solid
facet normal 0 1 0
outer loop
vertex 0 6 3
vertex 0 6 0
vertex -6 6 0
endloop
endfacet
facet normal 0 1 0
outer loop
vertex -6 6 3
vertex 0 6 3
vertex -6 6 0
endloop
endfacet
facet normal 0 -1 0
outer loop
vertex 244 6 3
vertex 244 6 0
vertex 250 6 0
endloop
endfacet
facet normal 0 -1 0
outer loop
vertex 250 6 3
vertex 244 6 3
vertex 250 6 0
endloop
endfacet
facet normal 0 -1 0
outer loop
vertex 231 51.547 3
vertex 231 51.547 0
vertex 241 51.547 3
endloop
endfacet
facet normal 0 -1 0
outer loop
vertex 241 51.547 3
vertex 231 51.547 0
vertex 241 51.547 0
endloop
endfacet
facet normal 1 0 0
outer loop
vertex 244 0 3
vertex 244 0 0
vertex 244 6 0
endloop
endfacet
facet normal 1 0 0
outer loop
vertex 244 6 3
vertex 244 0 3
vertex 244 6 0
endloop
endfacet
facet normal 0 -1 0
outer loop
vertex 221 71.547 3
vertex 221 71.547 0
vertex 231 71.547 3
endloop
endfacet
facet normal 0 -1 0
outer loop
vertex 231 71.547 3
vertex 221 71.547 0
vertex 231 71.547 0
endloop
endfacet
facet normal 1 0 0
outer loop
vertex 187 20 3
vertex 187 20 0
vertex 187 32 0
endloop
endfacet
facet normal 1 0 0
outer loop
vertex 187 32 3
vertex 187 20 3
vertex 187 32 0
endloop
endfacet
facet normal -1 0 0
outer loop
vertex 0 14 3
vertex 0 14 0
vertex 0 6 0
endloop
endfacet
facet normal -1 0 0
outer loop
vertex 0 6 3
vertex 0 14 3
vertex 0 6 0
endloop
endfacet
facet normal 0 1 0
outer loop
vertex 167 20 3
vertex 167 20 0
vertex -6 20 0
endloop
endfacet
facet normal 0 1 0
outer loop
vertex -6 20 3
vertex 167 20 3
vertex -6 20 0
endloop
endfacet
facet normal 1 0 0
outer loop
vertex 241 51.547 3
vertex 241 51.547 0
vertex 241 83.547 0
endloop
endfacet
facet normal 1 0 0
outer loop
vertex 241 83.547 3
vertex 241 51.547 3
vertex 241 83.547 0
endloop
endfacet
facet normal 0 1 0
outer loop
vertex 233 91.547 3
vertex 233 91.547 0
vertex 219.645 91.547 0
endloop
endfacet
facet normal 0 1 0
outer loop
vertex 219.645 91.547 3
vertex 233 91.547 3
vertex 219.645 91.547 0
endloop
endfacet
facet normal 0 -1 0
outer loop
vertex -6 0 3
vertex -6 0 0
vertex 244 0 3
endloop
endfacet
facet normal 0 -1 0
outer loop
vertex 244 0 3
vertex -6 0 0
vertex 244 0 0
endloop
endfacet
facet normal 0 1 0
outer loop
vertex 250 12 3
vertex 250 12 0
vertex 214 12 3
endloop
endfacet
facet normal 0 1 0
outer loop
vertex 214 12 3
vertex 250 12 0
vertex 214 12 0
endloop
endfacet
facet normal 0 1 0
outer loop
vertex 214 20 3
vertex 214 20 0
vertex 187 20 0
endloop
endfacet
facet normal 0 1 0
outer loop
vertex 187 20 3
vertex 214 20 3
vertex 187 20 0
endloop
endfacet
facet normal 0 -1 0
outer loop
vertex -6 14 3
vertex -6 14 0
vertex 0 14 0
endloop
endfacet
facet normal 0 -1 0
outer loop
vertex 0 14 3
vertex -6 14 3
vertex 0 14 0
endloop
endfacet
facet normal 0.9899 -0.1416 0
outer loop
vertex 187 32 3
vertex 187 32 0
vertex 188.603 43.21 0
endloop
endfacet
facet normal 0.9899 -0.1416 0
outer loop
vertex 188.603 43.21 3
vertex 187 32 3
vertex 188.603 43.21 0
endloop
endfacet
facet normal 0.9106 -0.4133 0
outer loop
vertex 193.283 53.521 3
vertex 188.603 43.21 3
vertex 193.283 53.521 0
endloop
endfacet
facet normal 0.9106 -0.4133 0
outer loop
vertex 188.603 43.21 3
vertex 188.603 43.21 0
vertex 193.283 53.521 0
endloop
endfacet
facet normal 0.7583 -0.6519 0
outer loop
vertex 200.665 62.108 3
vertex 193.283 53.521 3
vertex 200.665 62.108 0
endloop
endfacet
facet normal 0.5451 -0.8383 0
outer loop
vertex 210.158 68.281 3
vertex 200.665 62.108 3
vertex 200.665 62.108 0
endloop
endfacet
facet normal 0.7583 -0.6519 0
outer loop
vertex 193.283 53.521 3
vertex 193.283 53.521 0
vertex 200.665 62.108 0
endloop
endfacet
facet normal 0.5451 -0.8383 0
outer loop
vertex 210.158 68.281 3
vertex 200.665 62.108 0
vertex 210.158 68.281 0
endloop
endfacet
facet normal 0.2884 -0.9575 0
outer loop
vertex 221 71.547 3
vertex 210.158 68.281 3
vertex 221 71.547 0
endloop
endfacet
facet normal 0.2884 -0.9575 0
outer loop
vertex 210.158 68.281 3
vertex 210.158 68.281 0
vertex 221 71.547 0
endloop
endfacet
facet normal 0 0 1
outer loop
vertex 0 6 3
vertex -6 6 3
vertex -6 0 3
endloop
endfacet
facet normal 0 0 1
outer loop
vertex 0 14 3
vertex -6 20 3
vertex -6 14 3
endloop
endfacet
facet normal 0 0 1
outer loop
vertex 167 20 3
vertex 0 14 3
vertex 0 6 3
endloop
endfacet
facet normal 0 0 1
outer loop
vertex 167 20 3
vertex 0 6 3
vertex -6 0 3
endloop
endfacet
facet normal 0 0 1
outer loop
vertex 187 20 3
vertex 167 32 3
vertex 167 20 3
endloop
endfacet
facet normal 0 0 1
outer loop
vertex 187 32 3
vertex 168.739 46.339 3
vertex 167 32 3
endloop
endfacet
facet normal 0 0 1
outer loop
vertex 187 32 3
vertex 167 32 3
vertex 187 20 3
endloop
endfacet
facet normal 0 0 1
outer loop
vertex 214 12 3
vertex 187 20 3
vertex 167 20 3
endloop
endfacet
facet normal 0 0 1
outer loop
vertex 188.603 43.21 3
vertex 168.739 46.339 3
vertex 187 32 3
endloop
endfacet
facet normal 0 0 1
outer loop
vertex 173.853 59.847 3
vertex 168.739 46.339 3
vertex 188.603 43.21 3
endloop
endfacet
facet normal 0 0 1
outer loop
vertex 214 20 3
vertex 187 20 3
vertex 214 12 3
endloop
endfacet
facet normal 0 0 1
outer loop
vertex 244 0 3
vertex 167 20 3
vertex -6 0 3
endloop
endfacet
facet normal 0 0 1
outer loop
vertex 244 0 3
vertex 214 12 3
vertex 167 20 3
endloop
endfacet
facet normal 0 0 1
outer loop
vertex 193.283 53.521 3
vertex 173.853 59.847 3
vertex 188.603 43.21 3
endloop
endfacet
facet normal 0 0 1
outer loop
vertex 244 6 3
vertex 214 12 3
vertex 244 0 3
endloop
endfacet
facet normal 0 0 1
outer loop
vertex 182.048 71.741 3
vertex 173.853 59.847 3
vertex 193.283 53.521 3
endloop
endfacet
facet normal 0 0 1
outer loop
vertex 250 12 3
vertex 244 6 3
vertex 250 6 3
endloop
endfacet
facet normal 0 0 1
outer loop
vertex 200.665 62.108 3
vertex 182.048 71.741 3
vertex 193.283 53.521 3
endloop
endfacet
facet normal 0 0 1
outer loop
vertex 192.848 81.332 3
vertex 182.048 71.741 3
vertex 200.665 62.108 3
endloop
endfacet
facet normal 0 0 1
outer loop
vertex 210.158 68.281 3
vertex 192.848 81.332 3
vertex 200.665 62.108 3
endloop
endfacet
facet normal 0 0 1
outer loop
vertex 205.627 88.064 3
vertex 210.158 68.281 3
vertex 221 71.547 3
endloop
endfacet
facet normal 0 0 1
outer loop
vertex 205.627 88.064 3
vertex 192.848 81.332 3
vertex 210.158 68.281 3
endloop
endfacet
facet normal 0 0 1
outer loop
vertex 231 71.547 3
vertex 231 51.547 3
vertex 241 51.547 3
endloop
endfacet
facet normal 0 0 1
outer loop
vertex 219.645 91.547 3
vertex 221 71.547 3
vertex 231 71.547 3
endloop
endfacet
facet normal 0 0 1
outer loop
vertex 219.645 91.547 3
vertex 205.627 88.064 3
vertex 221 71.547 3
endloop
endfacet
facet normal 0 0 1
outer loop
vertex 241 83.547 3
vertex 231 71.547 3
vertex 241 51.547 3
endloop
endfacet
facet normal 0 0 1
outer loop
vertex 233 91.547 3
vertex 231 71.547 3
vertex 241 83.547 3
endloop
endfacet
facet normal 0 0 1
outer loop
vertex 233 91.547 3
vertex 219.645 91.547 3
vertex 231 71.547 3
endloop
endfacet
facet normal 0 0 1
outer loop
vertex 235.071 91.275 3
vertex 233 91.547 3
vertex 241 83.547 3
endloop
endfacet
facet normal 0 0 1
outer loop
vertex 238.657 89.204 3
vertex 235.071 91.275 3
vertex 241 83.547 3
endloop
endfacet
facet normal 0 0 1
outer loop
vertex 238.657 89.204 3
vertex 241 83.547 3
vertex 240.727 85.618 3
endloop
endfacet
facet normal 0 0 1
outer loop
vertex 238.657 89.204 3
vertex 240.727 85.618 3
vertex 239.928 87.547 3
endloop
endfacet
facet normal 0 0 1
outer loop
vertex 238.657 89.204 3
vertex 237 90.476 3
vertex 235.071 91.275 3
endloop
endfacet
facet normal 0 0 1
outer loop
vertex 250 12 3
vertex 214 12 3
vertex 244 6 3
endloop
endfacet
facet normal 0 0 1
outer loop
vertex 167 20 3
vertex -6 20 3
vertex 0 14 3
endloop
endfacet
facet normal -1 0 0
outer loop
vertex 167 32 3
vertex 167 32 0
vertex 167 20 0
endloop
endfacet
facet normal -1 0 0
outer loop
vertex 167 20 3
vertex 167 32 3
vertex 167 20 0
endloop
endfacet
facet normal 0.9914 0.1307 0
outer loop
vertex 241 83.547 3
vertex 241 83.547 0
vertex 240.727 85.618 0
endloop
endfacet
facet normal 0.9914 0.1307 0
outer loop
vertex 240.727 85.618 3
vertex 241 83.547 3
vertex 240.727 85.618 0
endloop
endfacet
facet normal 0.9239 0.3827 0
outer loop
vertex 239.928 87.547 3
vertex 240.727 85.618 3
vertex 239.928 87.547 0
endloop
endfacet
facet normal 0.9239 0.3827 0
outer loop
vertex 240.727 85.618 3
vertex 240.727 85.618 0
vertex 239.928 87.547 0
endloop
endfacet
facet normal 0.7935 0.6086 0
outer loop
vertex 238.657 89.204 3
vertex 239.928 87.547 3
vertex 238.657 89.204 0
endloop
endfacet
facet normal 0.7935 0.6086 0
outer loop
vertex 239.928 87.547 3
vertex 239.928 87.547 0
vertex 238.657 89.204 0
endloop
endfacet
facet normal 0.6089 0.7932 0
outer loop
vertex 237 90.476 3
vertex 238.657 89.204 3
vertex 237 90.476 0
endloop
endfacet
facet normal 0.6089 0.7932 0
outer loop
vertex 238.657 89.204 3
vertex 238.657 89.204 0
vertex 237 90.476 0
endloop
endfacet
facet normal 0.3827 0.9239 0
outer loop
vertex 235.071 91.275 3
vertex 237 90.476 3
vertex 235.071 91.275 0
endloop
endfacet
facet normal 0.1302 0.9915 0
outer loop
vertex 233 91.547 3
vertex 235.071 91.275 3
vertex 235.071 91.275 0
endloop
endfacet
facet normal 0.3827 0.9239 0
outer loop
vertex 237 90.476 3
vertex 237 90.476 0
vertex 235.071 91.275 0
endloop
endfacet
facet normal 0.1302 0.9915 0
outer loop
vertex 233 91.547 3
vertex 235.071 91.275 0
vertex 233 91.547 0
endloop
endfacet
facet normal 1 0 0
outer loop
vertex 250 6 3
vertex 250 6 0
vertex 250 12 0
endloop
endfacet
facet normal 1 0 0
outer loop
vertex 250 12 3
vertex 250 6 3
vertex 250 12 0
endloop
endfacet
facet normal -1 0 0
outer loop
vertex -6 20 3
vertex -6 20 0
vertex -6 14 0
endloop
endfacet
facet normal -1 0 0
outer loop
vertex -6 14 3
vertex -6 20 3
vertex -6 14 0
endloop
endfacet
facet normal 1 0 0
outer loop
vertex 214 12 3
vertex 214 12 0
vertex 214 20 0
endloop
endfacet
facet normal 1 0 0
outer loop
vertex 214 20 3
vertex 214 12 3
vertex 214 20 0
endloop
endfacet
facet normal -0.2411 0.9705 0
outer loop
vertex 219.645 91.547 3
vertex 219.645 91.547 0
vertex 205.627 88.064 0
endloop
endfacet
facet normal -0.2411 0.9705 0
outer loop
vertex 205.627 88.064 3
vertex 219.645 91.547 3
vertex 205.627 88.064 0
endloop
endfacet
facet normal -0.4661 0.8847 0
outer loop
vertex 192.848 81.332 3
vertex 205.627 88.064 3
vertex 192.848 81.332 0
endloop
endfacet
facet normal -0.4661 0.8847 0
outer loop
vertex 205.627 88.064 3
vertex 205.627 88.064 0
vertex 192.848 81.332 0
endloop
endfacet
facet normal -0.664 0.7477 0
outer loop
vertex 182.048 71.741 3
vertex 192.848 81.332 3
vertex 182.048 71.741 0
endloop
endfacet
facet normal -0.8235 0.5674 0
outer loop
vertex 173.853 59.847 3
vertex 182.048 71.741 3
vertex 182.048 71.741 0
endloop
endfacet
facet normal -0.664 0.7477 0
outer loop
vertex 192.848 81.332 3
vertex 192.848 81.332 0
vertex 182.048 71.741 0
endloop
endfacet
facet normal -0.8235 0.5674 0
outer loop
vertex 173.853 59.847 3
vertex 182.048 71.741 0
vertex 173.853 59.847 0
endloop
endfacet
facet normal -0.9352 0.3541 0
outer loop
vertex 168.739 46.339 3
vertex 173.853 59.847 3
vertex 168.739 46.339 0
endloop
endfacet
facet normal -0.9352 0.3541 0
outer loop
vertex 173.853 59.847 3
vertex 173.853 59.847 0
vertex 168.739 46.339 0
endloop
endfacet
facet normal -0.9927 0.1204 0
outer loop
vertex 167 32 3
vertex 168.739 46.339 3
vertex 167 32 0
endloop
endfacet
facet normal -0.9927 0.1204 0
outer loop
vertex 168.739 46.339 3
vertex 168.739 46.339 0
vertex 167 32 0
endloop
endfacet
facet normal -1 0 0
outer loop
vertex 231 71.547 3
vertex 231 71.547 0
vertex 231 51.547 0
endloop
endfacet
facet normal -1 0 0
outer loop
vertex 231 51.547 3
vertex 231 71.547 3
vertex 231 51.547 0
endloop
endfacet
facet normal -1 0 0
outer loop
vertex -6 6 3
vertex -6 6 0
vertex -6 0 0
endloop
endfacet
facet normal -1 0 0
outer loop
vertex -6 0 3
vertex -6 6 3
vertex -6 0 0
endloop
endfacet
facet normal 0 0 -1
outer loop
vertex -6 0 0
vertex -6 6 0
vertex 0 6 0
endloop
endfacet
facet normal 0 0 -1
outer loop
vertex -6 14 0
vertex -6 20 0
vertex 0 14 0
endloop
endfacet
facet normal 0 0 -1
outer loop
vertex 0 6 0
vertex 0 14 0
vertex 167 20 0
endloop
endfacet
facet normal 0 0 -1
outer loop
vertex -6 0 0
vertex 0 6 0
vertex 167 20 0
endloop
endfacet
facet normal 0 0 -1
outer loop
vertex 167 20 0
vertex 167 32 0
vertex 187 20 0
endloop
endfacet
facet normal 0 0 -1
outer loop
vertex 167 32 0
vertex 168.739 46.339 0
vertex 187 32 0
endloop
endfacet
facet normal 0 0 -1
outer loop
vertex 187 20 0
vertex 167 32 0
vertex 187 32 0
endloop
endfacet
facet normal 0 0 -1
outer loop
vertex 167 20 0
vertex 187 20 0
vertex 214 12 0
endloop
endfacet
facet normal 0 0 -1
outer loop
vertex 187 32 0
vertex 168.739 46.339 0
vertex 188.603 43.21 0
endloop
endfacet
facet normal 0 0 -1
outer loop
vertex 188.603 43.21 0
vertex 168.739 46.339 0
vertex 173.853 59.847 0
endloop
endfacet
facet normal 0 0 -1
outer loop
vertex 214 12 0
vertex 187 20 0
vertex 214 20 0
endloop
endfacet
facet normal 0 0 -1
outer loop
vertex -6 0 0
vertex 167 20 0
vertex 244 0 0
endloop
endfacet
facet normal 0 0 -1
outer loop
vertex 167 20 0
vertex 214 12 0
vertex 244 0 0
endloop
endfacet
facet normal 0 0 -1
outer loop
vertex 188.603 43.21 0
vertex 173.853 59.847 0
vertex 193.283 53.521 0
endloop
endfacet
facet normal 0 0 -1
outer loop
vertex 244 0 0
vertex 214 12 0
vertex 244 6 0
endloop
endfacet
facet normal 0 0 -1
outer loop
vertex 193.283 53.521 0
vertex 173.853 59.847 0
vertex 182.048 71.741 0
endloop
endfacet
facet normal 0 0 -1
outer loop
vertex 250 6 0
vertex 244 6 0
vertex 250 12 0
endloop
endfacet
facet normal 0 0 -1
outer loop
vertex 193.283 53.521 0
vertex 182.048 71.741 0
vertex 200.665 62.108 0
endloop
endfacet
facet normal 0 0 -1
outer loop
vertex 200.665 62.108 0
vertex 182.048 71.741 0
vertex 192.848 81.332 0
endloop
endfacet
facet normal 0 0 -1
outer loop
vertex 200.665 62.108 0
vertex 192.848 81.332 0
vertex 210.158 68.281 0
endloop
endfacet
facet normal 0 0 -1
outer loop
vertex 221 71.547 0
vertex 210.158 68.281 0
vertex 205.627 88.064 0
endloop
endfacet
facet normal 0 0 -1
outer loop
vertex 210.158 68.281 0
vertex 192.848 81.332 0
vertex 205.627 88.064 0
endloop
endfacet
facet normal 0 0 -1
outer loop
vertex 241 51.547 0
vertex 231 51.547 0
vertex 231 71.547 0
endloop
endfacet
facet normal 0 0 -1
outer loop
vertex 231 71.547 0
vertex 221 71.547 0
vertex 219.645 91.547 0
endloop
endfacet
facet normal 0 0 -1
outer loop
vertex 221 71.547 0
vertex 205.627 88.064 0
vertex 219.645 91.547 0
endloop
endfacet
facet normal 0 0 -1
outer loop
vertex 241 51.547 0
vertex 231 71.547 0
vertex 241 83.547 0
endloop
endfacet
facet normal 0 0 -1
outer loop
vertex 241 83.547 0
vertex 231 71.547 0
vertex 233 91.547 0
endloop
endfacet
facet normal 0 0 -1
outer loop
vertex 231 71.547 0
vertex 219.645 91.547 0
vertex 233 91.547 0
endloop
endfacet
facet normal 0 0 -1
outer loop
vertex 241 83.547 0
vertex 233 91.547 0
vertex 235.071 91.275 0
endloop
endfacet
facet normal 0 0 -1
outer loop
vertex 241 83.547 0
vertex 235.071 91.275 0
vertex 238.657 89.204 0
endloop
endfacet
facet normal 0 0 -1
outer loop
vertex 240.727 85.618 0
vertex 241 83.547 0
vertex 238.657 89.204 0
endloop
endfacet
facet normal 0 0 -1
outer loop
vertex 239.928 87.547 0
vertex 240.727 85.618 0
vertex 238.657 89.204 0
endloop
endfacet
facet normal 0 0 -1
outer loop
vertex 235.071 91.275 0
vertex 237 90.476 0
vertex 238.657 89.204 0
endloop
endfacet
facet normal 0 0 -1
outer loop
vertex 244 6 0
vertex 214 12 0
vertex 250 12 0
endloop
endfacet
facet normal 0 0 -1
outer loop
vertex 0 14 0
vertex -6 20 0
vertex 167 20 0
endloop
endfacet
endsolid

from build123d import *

# Parameters (mm, degrees)
EXTRUDE_1_DEPTH = 3


with BuildPart() as part:
    # Эскиз2 → Бобышка-Вытянуть1 (new body)
    with BuildSketch(Plane.XY):
        with BuildLine():
            Line((0, 0), (244, 0))
            Line((244, 0), (244, 6))
            Line((244, 6), (250, 6))
            Line((250, 6), (250, 12))
            Line((250, 12), (244, 12))
            Line((244, 12), (214, 12))
            Line((214, 12), (214, 20))
            Line((214, 20), (187, 20))
            Line((187, 20), (187, 32))
            ThreePointArc((187, 32), (196.668498224, 58.076809621), (221, 71.547439867))
            Line((221, 71.547439867), (231, 71.547439867))
            Line((231, 71.547439867), (231, 51.547439867))
            Line((231, 51.547439867), (241, 51.547439867))
            Line((241, 51.547439867), (241, 83.547439867))
            ThreePointArc((241, 83.547439867), (238.656854249, 89.204294116), (233, 91.547439867))
            Line((233, 91.547439867), (219.644566271, 91.547439867))
            ThreePointArc((219.644566271, 91.547439867), (182.048214587, 71.740873017), (167, 32))
            Line((167, 32), (167, 20))
            Line((167, 20), (0, 20))
            Line((0, 20), (-6, 20))
            Line((-6, 20), (-6, 14))
            Line((-6, 14), (0, 14))
            Line((0, 14), (0, 6))
            Line((0, 6), (-6, 6))
            Line((-6, 6), (-6, 0))
            Line((-6, 0), (0, 0))
        make_face()
    extrude(amount=EXTRUDE_1_DEPTH)


solid = part.part
